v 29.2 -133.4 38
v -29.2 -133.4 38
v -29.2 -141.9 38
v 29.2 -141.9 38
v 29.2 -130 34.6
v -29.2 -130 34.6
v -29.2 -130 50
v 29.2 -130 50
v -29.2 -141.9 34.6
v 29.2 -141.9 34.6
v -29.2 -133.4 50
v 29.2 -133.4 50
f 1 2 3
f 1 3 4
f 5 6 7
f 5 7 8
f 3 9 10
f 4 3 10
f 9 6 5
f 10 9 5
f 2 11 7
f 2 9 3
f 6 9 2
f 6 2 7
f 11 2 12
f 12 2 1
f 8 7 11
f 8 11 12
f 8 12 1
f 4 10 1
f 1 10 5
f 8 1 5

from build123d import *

# Parameters (mm, degrees)
FEMALE_MATING_FOOT_VERIFY_START                = 34.6
SKETCH_1_W                                     = 58.4
SKETCH_1_H                                     = 11.9
FEMALE_MATING_FOOT_VERIFY_DEPTH                = 3.4
RIGHT_ANGLE_SOCKET_INFERRED_NOT_CERTIFIE_START = 38
SKETCH_2_W                                     = 58.4
SKETCH_2_H                                     = 3.4
RIGHT_ANGLE_SOCKET_INFERRED_NOT_CERTIFIE_DEPTH = 12


with BuildPart() as part:
    # 草图1 → Female_mating_foot_VERIFY (new body)
    with BuildSketch(Plane.XY.offset(FEMALE_MATING_FOOT_VERIFY_START)):
        with Locations((0, -135.95)):
            Rectangle(SKETCH_1_W, SKETCH_1_H)
    extrude(amount=FEMALE_MATING_FOOT_VERIFY_DEPTH)

    # 草图2 → Right_angle_socket_INFERRED_NOT_CERTIFIED (add)
    with BuildSketch(Plane.XY.offset(RIGHT_ANGLE_SOCKET_INFERRED_NOT_CERTIFIE_START)):
        with Locations((0, -131.7)):
            Rectangle(SKETCH_2_W, SKETCH_2_H)
    extrude(amount=RIGHT_ANGLE_SOCKET_INFERRED_NOT_CERTIFIE_DEPTH)


solid = part.part
